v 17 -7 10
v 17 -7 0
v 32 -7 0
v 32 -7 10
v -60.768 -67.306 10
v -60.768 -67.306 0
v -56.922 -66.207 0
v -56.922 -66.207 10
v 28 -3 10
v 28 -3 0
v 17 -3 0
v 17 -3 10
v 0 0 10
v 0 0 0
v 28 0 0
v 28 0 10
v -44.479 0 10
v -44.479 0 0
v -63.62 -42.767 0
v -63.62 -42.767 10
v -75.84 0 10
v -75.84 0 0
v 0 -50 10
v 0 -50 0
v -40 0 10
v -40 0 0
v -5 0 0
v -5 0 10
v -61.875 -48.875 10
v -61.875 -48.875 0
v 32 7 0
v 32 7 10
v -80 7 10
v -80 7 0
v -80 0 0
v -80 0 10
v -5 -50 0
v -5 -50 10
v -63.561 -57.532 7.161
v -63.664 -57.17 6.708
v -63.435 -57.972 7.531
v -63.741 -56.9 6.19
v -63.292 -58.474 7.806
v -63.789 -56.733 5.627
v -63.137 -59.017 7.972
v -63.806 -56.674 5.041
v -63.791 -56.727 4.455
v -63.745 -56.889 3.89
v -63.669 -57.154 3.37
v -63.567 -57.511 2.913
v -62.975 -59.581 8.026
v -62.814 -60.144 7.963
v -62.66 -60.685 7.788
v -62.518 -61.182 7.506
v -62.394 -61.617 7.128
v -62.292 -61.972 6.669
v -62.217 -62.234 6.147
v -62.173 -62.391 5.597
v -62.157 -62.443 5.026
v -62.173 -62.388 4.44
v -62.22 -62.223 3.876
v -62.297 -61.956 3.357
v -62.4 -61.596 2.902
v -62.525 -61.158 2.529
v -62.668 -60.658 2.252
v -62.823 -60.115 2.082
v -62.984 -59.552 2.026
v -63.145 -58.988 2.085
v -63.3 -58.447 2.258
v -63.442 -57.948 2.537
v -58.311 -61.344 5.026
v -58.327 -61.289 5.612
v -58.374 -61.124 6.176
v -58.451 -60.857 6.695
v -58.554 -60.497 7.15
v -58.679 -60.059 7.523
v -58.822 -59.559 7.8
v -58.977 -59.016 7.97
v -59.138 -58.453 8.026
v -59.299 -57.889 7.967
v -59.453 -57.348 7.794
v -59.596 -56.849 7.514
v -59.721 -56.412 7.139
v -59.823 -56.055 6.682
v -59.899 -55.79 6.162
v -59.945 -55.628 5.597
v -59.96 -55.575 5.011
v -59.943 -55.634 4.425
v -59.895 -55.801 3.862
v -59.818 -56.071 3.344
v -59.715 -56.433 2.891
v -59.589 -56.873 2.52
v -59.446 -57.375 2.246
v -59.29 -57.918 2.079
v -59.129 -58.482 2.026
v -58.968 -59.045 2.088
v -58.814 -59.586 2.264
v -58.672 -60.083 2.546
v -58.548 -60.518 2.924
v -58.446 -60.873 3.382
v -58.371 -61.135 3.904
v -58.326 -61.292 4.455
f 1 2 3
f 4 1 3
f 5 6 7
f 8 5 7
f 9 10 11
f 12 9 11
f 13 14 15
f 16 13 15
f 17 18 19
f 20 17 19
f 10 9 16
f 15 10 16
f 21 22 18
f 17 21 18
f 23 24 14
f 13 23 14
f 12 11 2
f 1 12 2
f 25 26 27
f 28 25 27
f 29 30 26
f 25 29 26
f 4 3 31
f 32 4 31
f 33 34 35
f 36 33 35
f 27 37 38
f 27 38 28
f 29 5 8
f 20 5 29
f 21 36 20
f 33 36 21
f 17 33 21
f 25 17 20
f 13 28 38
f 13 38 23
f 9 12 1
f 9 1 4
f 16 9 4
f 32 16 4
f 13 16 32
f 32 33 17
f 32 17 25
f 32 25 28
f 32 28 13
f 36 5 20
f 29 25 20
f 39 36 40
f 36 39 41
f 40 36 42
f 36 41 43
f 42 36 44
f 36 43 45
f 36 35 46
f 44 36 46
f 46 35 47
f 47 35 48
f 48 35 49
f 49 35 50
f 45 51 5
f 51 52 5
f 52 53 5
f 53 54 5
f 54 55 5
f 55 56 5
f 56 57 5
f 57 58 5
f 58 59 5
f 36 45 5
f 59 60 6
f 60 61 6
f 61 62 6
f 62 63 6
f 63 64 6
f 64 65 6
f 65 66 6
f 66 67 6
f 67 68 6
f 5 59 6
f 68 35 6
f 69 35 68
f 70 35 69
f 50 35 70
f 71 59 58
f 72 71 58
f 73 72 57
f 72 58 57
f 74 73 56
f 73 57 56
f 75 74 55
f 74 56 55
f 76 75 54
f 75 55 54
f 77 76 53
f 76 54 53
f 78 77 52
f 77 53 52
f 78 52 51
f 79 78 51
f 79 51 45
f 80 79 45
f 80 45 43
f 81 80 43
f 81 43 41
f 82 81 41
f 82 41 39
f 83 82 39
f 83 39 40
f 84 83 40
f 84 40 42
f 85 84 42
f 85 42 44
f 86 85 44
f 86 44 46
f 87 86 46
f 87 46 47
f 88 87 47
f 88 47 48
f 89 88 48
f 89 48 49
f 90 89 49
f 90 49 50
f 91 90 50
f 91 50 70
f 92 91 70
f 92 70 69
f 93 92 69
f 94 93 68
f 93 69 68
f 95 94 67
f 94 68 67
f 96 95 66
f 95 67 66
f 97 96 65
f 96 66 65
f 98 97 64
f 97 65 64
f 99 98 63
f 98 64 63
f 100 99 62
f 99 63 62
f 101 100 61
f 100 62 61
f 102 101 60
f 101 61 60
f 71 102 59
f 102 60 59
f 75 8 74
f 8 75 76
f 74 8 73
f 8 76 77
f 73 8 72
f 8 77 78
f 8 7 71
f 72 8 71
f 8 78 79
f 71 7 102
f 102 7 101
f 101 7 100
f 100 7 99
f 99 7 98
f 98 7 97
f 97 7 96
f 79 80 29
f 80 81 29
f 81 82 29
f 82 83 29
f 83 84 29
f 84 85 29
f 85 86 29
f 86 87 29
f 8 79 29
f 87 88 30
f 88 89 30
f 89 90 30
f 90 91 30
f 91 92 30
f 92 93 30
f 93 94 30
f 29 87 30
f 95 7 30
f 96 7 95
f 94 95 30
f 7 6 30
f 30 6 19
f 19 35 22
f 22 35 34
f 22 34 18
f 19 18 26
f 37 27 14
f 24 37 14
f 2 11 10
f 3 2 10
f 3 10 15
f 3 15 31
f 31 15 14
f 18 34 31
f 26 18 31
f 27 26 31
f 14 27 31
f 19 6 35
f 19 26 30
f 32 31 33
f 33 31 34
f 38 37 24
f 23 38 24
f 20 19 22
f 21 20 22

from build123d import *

# Parameters (mm, degrees)
F0_W     = 5
F0_H     = 50
F0_W_2   = 4
F0_H_2   = 3
F1_DEPTH = 10
F3_R     = 3
F4_DEPTH = 10


with BuildPart() as f1:
    # F0 (on Top) → F1 (new body)
    with BuildSketch(Plane.XY):
        with Locations((-2.5, -25)):
            Rectangle(F0_W, F0_H)
        Polygon((-5, 0), (0, 0), (0, 7), (-80, 7), (-80, 0), (-75.83991, 0), (-44.478558, 0), (-40, 0), align=None)
        Polygon((0, 7), (0, 0), (28, 0), (32, 0), (32, 7), align=None)
        with Locations((30, -1.5)):
            Rectangle(F0_W_2, F0_H_2)
        Polygon((-61.87452, -48.874639), (-40, 0), (-44.478558, 0), (-63.619636, -42.76726), align=None)
        Polygon((32, -3), (28, -3), (17, -3), (17, -7), (32, -7), align=None)
        Polygon((-56.921913, -66.207265), (-61.87452, -48.874639), (-63.619636, -42.76726), (-75.83991, 0), (-80, 0), (-60.767984, -67.306237), align=None)
    extrude(amount=F1_DEPTH)

    # F3 (on face) → F4 (cut)
    with BuildSketch(Plane(origin=(-73.961299, -21.133627, 0), x_dir=(0.274743, -0.961518, 0), z_dir=(-0.961518, -0.274743, 0))):
        with Locations((39.963152, 5.025908)):
            Circle(F3_R)
    extrude(amount=-F4_DEPTH, mode=Mode.SUBTRACT)


solid = f1.part
